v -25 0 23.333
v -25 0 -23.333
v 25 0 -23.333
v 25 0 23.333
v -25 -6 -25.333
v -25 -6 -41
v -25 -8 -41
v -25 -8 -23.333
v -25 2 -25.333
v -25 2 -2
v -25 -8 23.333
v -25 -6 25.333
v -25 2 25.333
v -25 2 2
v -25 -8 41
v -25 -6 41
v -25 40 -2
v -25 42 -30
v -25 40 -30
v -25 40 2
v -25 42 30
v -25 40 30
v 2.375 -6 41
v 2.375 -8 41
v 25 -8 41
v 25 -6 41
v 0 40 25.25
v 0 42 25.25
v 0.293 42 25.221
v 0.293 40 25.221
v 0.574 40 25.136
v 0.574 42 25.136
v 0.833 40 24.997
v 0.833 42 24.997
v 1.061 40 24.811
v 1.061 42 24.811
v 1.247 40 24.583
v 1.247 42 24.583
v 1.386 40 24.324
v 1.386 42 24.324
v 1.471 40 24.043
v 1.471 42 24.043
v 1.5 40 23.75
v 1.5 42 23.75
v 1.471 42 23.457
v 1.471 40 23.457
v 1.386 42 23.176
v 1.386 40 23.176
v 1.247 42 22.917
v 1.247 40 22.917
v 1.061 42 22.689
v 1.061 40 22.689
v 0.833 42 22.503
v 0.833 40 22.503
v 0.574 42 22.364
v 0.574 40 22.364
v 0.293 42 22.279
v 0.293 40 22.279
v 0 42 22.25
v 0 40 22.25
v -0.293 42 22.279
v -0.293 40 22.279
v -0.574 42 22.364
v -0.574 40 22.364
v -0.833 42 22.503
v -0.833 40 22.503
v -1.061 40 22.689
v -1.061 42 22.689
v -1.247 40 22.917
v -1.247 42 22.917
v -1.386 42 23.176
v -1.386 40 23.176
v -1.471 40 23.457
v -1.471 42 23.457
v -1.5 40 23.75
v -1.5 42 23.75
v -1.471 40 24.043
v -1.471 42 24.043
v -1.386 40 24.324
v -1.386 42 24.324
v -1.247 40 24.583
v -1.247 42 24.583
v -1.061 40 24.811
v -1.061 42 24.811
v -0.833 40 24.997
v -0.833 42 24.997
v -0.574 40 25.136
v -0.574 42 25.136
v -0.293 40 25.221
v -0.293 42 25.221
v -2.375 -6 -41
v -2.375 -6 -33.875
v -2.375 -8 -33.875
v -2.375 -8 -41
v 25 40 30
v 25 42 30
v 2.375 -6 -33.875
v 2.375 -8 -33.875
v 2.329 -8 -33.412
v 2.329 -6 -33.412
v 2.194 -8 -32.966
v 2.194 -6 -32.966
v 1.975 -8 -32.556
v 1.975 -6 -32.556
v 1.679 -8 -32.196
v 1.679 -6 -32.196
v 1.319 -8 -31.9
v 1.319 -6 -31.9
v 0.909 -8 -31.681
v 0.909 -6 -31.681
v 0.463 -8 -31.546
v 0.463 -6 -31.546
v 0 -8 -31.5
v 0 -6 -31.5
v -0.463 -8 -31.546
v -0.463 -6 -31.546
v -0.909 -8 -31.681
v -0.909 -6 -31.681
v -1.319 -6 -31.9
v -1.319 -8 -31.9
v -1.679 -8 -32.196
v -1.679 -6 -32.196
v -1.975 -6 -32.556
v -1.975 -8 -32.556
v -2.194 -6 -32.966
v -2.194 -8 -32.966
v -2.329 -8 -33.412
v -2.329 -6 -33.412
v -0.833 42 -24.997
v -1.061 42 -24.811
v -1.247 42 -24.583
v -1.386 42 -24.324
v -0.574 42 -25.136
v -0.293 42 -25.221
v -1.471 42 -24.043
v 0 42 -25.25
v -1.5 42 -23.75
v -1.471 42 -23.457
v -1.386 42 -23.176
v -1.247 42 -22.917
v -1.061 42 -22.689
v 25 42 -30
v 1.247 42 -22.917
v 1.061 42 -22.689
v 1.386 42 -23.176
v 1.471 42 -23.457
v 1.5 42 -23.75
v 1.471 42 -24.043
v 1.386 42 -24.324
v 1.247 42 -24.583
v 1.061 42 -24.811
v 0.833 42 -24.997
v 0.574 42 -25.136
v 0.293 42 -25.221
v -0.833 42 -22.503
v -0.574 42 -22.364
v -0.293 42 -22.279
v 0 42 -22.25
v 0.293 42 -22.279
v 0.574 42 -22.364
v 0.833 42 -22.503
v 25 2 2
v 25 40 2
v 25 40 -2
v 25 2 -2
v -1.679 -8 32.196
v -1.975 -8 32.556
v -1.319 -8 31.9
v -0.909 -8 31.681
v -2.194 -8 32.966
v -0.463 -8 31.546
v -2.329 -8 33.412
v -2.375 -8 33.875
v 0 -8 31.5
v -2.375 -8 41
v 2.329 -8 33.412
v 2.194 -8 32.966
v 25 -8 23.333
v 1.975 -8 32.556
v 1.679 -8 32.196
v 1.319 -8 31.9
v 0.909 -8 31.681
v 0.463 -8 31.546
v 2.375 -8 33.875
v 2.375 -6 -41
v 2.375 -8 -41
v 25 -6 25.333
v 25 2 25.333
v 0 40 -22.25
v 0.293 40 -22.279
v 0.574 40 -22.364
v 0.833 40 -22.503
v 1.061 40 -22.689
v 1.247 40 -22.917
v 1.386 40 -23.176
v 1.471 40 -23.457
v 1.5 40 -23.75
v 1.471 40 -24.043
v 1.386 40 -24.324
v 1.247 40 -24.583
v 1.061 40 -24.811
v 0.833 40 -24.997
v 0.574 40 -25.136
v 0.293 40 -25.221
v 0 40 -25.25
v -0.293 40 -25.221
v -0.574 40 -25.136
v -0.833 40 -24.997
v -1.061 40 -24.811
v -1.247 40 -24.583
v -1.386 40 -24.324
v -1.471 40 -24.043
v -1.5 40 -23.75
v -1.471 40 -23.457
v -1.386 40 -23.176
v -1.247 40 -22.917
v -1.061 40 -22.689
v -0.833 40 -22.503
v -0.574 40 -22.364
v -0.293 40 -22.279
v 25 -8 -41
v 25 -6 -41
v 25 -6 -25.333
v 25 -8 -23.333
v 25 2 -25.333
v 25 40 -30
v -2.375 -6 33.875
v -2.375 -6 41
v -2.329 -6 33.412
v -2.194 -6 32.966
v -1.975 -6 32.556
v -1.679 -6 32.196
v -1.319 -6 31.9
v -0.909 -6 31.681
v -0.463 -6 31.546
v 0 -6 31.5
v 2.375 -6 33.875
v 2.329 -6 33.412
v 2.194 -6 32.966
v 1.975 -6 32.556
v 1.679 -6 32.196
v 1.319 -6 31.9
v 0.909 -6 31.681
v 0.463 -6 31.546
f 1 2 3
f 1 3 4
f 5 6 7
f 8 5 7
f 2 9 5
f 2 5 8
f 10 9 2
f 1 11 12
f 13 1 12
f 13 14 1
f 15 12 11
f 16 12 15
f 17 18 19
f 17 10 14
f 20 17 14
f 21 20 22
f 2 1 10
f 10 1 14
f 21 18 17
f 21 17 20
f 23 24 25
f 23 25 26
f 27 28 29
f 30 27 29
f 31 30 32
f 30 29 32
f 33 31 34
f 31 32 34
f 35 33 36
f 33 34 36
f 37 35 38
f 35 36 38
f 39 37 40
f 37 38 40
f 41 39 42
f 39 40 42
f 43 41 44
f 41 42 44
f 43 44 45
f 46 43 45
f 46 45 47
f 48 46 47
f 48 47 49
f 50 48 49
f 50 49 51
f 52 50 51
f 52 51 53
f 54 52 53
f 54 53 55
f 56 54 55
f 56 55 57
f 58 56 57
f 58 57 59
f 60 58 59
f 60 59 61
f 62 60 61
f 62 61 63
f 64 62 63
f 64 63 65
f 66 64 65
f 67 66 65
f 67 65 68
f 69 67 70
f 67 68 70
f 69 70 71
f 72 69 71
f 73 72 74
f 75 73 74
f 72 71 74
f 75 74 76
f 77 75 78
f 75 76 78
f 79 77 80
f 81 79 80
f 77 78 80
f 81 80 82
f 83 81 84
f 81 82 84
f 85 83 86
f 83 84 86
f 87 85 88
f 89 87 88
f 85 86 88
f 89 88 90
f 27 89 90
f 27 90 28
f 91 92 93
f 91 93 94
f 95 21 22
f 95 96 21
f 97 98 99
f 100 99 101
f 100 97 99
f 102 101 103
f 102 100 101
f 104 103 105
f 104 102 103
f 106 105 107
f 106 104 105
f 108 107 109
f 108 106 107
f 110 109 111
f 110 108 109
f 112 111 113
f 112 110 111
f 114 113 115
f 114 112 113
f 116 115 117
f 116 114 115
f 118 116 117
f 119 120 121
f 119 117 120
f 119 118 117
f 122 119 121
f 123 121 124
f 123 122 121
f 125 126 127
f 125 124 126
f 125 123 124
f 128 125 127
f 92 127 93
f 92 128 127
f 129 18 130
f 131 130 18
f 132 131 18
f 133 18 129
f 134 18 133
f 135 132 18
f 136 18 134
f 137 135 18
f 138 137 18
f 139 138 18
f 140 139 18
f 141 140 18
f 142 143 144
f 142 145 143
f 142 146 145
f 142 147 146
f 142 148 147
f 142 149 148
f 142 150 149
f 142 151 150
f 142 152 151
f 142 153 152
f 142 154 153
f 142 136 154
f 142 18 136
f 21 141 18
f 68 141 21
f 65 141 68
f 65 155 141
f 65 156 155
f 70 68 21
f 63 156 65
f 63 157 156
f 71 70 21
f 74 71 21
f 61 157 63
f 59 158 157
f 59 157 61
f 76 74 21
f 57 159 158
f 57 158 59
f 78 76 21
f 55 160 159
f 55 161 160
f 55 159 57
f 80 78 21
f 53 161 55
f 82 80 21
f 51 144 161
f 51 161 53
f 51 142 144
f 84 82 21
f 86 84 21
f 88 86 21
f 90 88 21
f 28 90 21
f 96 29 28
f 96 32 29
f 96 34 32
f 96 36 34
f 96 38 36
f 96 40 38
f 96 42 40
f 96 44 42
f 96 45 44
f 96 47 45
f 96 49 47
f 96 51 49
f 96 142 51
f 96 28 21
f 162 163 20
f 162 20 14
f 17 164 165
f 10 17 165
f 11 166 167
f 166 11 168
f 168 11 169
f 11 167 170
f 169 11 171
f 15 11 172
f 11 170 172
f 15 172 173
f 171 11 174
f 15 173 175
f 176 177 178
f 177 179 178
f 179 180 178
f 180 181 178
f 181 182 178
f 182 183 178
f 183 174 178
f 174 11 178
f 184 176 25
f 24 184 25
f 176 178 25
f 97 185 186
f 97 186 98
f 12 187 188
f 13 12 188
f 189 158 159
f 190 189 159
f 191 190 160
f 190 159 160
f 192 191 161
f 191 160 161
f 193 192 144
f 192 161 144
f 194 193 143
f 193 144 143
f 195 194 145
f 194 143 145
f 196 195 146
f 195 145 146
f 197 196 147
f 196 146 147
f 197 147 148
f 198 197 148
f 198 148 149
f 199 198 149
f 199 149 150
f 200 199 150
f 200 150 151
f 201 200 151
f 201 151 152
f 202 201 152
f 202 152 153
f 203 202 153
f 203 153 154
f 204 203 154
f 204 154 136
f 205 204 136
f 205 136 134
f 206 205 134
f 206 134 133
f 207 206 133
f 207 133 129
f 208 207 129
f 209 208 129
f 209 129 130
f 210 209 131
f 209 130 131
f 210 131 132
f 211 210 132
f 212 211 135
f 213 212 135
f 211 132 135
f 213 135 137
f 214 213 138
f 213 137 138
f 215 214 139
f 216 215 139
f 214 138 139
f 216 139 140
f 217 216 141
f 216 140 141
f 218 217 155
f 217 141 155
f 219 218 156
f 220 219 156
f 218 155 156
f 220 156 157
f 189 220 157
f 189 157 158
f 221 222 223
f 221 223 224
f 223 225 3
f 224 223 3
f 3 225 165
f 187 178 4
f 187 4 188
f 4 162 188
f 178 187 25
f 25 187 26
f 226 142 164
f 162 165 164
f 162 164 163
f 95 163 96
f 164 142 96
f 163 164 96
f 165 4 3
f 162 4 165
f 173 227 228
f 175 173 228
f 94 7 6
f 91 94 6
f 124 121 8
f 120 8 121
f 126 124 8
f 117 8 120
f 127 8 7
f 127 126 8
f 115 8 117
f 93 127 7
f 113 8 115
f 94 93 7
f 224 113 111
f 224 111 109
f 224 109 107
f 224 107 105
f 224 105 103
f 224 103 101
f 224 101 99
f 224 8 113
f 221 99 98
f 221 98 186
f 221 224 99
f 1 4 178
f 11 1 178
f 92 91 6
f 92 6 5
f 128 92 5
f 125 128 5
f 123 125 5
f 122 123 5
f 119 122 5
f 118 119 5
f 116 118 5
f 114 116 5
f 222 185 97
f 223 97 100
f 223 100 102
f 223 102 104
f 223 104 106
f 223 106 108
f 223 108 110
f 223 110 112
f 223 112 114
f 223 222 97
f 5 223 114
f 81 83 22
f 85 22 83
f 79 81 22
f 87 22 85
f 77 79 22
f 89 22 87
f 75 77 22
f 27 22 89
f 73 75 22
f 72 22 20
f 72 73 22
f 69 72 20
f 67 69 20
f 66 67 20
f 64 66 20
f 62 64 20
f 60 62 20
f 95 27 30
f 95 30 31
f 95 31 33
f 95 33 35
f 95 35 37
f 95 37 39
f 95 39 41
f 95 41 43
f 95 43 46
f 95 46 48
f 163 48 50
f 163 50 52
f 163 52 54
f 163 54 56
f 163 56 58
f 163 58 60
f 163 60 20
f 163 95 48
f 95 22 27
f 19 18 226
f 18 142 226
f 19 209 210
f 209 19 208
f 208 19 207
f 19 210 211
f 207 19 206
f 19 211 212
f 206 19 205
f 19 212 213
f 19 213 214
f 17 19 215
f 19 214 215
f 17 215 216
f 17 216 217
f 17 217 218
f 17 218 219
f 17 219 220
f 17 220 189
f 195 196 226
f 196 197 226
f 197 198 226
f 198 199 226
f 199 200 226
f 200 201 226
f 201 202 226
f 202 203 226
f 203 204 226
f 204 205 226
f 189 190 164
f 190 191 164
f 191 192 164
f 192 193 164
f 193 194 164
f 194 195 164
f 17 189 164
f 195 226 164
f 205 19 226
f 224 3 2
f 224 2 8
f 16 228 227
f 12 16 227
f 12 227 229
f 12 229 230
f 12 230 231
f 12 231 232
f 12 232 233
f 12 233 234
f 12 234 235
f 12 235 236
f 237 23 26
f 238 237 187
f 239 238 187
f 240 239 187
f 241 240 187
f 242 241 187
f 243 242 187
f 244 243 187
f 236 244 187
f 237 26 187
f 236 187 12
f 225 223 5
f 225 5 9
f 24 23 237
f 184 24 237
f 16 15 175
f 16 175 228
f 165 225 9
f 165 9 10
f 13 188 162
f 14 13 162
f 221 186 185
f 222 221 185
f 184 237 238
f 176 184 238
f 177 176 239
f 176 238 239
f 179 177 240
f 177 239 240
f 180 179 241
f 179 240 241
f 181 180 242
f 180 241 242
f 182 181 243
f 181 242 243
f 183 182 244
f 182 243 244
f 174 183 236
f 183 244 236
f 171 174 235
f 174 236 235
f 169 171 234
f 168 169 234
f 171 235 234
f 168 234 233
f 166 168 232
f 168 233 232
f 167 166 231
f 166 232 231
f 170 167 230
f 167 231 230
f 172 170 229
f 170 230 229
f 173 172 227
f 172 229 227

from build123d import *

# Parameters (mm, degrees)
EXTRUDE_THIN1_DEPTH = 25
EXTRUDE_THIN2_DEPTH = 25
CUT_EXTRUDE1_DEPTH  = 10
SKETCH4_R           = 1.5
CUT_EXTRUDE2_DEPTH  = 3


with BuildPart() as part:
    # Sketch1 → Extrude-Thin1 (new, symmetric)
    with BuildSketch(Plane(origin=(0, 0, 0), x_dir=(0, 0, -1), z_dir=(1, 0, 0))):
        Polygon((0, 0), (23.333492345, 0), (23.333492345, -8), (41, -8), (41, -6), (25.333492345, -6), (25.333492345, 2), (0, 2), align=None)
    extrude(amount=EXTRUDE_THIN1_DEPTH, both=True)

    # Sketch2 → Extrude-Thin2 (add, symmetric)
    with BuildSketch(Plane(origin=(0, 0, 0), x_dir=(0, 0, -1), z_dir=(1, 0, 0))):
        Polygon((0, 0), (0, 42), (30, 42), (30, 40), (2, 40), (2, 0), align=None)
    extrude(amount=EXTRUDE_THIN2_DEPTH, both=True)

    # Mirror1: part across face


with BuildPart() as part_1:
    add(part.part)
    add(part.part.mirror(Plane(origin=(0, 21, 0), x_dir=(1, 0, 0), z_dir=(0, 0, 1))))

    # Sketch3 → Cut-Extrude1 (cut)
    with BuildSketch(Plane(origin=(0, -6, 0), x_dir=(1, 0, 0), z_dir=(0, 1, 0))):
        with BuildLine():
            Line((-2.375, 33.875), (-2.375, 51.560435524))
            ThreePointArc((-2.375, 51.560435524), (0, 53.935435524), (2.375, 51.560435524))
            Line((2.375, 51.560435524), (2.375, 33.875))
            ThreePointArc((2.375, 33.875), (0, 31.5), (-2.375, 33.875))
        make_face()
        with BuildLine():
            Line((-2.375, -33.875), (-2.375, -51.560435524))
            ThreePointArc((-2.375, -51.560435524), (0, -53.935435524), (2.375, -51.560435524))
            Line((2.375, -51.560435524), (2.375, -33.875))
            ThreePointArc((2.375, -33.875), (0, -31.5), (-2.375, -33.875))
        make_face()
    extrude(amount=-CUT_EXTRUDE1_DEPTH, mode=Mode.SUBTRACT)

    # Sketch4 → Cut-Extrude2 (cut)
    with BuildSketch(Plane(origin=(0, 42, 0), x_dir=(1, 0, 0), z_dir=(0, 1, 0))):
        with Locations(Location((0, 23.75, 0), (0, 0, 270))):
            Circle(SKETCH4_R)
        with Locations(Location((0, -23.75, 0), (0, 0, 270))):
            Circle(SKETCH4_R)
    extrude(amount=-CUT_EXTRUDE2_DEPTH, mode=Mode.SUBTRACT)


solid = part_1.part
